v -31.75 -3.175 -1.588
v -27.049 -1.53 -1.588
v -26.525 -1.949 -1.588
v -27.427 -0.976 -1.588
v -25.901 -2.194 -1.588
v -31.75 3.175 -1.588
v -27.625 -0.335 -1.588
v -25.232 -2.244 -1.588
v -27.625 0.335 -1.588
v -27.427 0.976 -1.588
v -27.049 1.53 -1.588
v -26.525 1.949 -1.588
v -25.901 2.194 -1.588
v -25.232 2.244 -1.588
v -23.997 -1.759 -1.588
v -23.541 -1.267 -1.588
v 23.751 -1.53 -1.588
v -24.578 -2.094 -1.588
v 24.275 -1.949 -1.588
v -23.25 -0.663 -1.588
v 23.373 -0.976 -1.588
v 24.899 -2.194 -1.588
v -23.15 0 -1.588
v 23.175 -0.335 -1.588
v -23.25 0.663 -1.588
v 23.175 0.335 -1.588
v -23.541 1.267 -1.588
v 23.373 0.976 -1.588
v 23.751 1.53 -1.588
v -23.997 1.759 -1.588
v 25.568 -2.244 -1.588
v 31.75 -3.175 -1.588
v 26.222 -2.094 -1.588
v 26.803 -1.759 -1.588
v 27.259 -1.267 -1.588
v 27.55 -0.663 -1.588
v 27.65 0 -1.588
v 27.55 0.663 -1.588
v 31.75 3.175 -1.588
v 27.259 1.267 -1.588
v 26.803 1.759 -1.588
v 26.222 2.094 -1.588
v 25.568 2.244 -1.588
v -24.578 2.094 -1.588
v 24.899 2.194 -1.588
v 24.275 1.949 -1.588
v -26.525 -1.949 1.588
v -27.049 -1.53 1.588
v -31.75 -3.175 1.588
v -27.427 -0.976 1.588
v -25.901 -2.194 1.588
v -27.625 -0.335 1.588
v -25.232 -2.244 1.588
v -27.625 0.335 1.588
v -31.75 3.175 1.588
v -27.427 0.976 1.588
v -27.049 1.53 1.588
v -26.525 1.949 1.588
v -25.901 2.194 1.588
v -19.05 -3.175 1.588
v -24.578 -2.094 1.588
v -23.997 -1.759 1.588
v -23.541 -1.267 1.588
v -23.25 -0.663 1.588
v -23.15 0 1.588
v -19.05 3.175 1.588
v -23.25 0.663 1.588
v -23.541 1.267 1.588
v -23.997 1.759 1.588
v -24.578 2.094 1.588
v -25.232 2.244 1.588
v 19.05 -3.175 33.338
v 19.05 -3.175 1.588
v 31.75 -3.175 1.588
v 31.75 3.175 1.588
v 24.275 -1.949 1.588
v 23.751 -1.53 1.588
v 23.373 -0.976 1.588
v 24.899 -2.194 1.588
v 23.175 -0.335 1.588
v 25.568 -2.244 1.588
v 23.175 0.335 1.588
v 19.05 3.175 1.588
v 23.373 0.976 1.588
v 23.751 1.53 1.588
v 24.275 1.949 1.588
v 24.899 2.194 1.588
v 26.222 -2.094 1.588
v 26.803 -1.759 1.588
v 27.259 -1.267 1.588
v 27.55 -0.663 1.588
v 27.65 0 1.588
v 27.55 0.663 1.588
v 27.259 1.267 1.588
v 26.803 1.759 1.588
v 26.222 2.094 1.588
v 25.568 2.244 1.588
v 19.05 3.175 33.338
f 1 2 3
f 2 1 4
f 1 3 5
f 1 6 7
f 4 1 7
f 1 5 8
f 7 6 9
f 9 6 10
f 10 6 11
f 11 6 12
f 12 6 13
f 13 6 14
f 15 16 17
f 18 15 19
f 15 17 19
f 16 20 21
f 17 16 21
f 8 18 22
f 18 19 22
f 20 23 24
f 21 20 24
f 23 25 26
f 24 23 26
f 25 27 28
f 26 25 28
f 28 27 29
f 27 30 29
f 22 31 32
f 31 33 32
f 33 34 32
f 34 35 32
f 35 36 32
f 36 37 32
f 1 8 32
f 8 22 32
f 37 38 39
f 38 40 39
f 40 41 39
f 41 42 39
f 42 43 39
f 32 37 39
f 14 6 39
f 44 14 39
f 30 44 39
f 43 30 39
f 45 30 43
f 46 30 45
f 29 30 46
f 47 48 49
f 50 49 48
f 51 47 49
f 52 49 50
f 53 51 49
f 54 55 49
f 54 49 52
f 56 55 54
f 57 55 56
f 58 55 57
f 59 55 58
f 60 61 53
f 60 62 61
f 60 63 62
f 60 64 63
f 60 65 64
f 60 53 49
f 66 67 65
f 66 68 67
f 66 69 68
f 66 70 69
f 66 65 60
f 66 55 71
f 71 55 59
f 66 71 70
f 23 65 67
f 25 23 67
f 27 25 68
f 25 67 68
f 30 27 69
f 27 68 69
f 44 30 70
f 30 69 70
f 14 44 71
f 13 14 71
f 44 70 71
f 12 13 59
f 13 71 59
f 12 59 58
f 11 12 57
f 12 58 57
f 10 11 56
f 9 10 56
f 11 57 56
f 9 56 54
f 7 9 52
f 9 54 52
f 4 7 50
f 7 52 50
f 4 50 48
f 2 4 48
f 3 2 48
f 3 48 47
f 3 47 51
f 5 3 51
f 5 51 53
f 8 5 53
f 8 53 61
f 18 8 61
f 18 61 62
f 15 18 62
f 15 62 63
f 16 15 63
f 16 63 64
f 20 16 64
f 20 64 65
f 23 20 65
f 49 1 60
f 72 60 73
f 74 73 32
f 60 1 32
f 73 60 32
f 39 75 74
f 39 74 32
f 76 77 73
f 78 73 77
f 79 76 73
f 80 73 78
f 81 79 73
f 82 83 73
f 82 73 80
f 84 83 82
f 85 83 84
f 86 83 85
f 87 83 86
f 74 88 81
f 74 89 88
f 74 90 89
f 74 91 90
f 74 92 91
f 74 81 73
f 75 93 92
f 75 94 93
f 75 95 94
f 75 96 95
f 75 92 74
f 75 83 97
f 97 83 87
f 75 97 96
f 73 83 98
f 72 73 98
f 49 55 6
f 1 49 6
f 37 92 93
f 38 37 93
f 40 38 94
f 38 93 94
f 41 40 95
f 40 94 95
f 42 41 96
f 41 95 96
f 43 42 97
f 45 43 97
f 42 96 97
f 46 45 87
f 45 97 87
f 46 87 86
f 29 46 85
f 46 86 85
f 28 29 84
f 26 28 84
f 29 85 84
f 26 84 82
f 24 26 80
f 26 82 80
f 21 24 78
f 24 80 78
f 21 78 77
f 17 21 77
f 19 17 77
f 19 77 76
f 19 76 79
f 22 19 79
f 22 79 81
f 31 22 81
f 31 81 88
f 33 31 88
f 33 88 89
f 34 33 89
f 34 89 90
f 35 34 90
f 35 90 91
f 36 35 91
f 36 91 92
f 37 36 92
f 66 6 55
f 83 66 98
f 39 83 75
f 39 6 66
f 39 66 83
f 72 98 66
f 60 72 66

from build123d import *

# Parameters (mm, degrees)
SKETCH7_W           = 63.5
SKETCH7_H           = 3.175
BOSS_EXTRUDE4_DEPTH = 3.175
SKETCH8_R           = 2.2499955
CUT_EXTRUDE3_DEPTH  = 4.175
BOSS_EXTRUDE5_DEPTH = 6.35


with BuildPart() as part:
    # Sketch7 → Boss-Extrude4 (new body, symmetric)
    with BuildSketch(Plane(origin=(0, 0, 0), x_dir=(1, 0, 0), z_dir=(0, 1, 0))):
        Rectangle(SKETCH7_W, SKETCH7_H)
    extrude(amount=BOSS_EXTRUDE4_DEPTH, both=True)

    # Sketch8 → Cut-Extrude3 (cut, through all)
    with BuildSketch(Plane.XY.offset(1.5875)):
        with Locations((-25.4, 0)):
            Circle(SKETCH8_R)
        with Locations((25.4, 0)):
            Circle(SKETCH8_R)
    extrude(amount=-CUT_EXTRUDE3_DEPTH, mode=Mode.SUBTRACT)

    # Sketch9 → Boss-Extrude5 (add)
    with BuildSketch(Plane(origin=(0, 3.175, 0), x_dir=(1, 0, 0), z_dir=(0, 1, 0))):
        Polygon((19.05, -1.5875), (19.05, -33.3375), (-19.05, -1.5875), align=None)
    extrude(amount=-BOSS_EXTRUDE5_DEPTH)


solid = part.part
